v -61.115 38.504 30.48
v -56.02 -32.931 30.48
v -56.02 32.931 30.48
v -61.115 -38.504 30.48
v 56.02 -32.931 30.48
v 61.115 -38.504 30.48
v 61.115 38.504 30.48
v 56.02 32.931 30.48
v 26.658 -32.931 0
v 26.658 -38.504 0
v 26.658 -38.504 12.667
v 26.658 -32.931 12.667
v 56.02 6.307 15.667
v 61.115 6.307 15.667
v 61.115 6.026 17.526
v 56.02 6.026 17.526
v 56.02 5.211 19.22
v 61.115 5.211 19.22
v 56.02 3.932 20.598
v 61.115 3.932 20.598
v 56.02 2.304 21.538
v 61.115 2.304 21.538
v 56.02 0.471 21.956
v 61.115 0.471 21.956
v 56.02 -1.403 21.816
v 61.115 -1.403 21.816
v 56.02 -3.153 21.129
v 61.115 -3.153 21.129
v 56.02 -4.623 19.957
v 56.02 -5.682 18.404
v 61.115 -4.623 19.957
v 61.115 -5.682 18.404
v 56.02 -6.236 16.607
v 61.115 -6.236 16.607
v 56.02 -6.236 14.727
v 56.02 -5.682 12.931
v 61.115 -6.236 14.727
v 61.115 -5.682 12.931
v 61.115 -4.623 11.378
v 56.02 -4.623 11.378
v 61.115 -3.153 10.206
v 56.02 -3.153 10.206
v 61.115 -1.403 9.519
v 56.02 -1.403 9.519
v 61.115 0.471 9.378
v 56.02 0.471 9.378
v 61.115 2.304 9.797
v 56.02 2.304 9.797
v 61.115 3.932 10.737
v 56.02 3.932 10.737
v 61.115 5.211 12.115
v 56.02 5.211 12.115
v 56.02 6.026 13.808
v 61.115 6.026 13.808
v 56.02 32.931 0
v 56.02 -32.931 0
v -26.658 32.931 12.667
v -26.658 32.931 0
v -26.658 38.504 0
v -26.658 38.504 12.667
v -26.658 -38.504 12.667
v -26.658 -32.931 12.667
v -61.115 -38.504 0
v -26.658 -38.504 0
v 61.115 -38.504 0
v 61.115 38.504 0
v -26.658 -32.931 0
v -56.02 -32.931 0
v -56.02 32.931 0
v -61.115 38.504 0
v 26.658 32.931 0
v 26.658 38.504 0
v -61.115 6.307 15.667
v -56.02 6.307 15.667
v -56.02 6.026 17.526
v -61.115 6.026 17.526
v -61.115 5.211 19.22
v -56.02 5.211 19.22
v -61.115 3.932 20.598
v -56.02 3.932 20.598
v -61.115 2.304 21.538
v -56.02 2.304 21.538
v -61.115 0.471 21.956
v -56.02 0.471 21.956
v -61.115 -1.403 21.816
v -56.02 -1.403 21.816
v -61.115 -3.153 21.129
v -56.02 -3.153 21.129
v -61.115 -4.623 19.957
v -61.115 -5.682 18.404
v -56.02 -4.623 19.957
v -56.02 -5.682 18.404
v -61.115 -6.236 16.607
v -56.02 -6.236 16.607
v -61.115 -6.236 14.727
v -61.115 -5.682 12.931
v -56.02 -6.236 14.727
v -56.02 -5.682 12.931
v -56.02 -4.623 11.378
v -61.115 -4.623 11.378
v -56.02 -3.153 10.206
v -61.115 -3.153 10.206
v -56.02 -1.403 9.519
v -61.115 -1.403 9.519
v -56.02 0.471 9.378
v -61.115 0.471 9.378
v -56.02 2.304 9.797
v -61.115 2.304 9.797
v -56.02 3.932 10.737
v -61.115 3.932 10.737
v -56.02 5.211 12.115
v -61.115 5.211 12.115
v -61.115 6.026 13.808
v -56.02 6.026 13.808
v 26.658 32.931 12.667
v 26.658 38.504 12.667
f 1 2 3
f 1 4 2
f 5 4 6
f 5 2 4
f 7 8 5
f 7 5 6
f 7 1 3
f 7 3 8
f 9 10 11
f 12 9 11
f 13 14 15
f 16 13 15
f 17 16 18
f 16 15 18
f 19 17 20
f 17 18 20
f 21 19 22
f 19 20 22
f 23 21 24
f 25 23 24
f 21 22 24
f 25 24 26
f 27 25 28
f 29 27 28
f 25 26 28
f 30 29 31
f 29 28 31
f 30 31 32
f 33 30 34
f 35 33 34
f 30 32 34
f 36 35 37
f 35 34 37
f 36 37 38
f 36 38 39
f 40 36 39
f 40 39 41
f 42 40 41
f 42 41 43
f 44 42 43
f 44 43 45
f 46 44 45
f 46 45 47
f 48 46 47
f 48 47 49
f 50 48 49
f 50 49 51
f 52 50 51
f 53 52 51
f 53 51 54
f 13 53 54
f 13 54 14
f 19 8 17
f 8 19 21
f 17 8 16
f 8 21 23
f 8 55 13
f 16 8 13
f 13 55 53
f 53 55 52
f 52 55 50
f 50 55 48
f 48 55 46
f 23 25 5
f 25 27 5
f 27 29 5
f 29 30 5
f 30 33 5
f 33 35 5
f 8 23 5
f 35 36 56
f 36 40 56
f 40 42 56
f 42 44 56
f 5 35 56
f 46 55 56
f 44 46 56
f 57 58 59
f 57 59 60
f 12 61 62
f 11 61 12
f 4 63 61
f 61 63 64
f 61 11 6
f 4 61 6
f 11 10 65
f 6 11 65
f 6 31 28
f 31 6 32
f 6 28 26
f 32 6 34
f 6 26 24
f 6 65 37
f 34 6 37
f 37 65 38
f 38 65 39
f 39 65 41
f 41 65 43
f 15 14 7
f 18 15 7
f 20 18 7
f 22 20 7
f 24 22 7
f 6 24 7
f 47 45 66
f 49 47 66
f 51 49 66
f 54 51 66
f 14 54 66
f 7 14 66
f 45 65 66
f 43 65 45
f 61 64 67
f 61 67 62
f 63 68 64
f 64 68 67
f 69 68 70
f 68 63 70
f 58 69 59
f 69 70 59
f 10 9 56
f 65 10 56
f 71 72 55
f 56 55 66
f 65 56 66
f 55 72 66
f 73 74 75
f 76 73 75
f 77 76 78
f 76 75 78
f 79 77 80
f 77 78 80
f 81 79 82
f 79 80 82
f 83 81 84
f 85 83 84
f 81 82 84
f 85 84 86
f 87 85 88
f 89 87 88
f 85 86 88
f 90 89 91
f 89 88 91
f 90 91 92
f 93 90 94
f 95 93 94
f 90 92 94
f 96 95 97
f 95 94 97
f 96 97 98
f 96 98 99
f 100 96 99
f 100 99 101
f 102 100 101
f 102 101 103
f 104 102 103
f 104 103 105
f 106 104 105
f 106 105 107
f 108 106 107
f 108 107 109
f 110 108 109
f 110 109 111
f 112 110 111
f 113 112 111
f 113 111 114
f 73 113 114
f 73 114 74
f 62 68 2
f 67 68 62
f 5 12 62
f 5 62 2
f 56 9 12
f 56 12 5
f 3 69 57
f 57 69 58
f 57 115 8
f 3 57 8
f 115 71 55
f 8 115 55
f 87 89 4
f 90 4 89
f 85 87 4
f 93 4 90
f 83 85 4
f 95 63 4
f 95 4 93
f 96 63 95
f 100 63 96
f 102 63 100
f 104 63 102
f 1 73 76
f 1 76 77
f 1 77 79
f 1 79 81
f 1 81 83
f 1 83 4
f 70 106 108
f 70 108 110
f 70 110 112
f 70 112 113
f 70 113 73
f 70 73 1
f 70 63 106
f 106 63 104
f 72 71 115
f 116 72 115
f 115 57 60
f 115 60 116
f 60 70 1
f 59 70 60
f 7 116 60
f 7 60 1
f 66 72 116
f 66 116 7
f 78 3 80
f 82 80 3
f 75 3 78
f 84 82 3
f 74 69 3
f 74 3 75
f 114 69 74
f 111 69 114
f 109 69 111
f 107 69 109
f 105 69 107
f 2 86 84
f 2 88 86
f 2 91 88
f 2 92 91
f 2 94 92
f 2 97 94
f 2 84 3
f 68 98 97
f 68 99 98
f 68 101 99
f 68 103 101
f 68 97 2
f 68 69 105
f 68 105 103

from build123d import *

# Parameters (mm, degrees)
F0_W     = 122.230552
F0_H     = 77.007032
F1_DEPTH = 30.48
F2_W     = 112.040394
F2_H     = 65.861254
F3_DEPTH = 120.65
F4_R     = 6.306585
F5_DEPTH = 227.33
F6_W     = 53.315248
F6_H     = 12.666776
F7_DEPTH = 179.578


with BuildPart() as f1:
    # F0 (on Top) → F1 (new body)
    with BuildSketch(Plane.XY):
        Rectangle(F0_W, F0_H)
    extrude(amount=F1_DEPTH)

    # F2 (on face) → F3 (cut)
    with BuildSketch(Plane(origin=(0, 0, 0), x_dir=(1, 0, 0), z_dir=(0, 0, -1))):
        Rectangle(F2_W, F2_H)
    extrude(amount=-F3_DEPTH, mode=Mode.SUBTRACT)

    # F4 (on face) → F5 (cut)
    with BuildSketch(Plane.YZ.offset(61.115276)):
        with Locations((0, 15.667252)):
            Circle(F4_R)
    extrude(amount=-F5_DEPTH, mode=Mode.SUBTRACT)

    # F6 (on face) → F7 (cut)
    with BuildSketch(Plane.XZ.offset(38.503516)):
        with Locations((0, 6.333388)):
            Rectangle(F6_W, F6_H)
    extrude(amount=-F7_DEPTH, mode=Mode.SUBTRACT)


solid = f1.part
